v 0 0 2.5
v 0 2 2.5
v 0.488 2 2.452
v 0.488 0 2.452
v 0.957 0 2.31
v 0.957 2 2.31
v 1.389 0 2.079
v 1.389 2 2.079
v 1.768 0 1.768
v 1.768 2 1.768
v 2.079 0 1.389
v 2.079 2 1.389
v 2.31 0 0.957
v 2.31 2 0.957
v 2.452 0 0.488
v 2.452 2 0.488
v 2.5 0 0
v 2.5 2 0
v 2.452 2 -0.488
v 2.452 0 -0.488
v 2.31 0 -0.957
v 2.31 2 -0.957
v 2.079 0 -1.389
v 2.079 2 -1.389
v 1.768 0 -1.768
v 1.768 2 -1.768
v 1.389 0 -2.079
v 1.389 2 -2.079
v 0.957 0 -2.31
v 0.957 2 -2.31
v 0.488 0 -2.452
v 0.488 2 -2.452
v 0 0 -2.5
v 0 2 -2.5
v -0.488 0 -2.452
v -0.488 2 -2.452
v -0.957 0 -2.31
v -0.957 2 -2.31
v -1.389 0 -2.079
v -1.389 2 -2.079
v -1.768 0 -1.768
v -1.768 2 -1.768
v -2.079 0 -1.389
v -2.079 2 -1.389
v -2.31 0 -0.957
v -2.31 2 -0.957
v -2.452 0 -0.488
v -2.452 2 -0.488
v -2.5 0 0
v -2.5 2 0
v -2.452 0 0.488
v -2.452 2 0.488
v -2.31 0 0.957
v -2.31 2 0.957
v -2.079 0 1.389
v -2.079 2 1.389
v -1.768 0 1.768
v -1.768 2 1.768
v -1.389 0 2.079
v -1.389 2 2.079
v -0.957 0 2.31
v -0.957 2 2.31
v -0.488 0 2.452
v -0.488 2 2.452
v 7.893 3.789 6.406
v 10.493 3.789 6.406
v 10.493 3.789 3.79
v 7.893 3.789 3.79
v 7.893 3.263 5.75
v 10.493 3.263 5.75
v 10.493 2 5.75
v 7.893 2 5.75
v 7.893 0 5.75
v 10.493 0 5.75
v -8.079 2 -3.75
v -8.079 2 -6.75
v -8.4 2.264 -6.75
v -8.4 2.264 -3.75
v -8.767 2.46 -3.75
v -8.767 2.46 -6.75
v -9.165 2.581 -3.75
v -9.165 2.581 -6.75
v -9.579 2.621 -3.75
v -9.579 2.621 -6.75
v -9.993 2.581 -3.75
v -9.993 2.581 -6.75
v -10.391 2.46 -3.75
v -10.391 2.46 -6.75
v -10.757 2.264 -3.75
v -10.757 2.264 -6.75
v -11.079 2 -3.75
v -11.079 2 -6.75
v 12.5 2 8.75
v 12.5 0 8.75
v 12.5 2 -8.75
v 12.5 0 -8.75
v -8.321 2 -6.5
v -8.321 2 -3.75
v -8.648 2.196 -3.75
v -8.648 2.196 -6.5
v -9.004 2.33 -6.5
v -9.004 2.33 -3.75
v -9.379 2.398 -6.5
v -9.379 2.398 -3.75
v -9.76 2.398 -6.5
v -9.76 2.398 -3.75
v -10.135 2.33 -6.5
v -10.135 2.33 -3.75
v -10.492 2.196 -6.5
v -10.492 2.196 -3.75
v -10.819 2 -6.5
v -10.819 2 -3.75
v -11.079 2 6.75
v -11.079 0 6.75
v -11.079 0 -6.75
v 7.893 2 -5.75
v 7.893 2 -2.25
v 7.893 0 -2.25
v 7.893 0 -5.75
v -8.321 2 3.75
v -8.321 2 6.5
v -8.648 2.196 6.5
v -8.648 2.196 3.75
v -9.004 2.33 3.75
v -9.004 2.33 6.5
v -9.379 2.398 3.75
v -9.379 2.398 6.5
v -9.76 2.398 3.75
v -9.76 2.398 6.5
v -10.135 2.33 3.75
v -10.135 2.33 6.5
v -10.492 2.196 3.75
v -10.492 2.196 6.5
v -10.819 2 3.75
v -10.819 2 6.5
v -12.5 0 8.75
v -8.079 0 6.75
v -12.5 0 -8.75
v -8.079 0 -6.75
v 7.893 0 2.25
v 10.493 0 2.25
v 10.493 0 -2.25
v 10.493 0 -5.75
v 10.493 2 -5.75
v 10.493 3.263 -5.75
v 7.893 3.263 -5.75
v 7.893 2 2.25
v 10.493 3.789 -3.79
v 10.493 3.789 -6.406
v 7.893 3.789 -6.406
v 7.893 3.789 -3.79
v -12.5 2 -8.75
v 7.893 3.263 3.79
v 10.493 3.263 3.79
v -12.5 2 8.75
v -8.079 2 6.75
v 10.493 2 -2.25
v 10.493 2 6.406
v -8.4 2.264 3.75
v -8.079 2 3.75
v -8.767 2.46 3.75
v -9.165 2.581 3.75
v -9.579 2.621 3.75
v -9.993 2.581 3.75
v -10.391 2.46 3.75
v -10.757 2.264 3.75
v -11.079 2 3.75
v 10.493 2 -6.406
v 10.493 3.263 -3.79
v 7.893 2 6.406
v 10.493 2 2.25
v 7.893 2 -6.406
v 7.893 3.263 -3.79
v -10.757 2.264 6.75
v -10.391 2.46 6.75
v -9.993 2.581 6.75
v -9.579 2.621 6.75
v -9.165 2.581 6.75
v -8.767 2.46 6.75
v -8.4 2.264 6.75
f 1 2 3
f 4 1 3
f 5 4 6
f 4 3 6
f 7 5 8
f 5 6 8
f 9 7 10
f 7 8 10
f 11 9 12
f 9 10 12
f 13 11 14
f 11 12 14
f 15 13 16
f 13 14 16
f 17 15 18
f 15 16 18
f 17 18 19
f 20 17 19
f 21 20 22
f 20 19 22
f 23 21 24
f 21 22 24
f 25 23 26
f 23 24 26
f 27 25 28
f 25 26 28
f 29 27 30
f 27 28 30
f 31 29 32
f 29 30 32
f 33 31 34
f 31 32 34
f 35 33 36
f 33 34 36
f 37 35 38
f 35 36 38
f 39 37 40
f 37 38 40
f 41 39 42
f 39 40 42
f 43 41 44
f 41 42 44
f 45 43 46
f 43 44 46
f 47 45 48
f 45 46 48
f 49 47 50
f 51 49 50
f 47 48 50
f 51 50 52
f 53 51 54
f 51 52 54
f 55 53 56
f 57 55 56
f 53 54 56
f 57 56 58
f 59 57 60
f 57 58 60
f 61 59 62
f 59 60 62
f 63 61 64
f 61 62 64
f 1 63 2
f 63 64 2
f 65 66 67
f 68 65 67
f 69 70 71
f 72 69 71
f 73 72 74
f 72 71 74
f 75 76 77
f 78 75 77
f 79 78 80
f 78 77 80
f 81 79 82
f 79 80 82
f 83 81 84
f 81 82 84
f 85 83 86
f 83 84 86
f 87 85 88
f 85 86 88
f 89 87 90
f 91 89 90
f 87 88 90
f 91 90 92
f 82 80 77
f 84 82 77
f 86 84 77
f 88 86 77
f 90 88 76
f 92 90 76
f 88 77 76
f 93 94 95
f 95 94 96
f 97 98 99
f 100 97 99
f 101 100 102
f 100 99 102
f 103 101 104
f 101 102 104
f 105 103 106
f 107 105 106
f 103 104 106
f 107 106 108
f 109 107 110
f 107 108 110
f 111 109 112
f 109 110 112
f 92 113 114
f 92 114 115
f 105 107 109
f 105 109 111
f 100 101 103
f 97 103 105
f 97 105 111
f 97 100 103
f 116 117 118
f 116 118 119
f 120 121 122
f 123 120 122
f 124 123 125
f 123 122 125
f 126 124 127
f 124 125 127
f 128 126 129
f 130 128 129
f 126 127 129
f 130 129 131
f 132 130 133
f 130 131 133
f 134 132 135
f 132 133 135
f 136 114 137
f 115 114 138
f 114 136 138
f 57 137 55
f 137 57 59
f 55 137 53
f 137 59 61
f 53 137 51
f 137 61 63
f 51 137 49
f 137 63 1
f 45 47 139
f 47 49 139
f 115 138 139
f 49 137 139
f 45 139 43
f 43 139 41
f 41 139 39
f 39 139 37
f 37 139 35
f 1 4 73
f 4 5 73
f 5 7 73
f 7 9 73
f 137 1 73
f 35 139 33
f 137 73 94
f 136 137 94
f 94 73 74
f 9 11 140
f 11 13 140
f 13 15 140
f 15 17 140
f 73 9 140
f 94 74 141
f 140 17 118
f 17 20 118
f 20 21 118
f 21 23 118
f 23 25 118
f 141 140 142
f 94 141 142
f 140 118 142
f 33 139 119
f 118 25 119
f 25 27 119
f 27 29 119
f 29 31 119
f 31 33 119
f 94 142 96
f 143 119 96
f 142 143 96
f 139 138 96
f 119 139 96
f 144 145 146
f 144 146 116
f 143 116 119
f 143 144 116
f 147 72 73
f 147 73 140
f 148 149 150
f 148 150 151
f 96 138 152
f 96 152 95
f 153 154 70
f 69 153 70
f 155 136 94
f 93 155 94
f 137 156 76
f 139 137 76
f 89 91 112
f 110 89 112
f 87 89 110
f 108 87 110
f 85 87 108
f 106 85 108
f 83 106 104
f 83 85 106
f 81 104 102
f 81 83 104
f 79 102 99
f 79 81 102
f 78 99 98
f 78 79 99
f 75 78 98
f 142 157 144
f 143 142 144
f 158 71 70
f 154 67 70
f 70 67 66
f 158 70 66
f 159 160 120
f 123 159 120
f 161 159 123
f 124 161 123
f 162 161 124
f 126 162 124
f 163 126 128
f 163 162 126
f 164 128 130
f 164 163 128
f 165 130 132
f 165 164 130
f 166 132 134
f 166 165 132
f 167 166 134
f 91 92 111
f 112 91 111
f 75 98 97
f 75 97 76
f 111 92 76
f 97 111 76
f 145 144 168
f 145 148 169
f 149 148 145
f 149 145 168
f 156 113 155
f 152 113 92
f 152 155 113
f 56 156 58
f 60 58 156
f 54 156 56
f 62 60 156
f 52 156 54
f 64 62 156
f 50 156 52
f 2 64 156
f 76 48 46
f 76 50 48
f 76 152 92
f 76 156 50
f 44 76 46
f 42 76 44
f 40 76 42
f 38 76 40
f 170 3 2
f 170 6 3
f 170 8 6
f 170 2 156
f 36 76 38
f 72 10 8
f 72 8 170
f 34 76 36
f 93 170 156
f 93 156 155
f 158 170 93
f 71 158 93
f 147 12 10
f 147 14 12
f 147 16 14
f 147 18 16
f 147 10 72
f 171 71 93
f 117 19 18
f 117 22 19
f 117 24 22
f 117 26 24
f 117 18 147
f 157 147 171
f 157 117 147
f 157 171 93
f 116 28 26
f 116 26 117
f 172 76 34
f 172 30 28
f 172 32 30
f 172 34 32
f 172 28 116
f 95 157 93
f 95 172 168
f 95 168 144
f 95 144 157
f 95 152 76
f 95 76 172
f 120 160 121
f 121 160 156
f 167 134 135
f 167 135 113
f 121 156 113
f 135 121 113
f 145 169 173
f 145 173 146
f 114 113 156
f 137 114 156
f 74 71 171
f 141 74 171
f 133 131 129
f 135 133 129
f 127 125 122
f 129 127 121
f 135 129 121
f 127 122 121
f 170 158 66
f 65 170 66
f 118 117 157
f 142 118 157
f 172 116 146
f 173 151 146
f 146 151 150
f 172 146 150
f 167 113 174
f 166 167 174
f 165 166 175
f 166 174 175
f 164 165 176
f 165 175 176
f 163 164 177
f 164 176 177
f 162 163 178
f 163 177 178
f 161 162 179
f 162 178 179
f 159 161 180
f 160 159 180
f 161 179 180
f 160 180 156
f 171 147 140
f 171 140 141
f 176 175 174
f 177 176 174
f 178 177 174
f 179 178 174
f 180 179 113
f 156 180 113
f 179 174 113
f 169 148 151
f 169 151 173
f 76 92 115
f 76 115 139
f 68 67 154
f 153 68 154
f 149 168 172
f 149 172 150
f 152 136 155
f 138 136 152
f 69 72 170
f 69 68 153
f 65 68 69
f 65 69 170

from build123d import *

# Parameters (mm, degrees)
SKETCH_1_W          = 25
SKETCH_1_H          = 17.5
EXTRUDE_1_DEPTH     = 2
SKETCH_2_R          = 2.5
CUT_EXTRUDE_1_DEPTH = 2
SKETCH_3_W          = 2.6
SKETCH_3_H          = 3.5
CUT_EXTRUDE_2_DEPTH = 2
SKETCH_4_W          = 3
SKETCH_4_H          = 13.5
CUT_EXTRUDE_3_DEPTH = 2
EXTRUDE_2_DEPTH     = 2.6
EXTRUDE_3_DEPTH     = 3
EXTRUDE_4_DEPTH     = 3
CUT_EXTRUDE_5_DEPTH = 6.5


with BuildPart() as part:
    # 草图1 → 凸台-拉伸1 (new body)
    with BuildSketch(Plane(origin=(0, 0, 0), x_dir=(1, 0, 0), z_dir=(0, 1, 0))):
        Rectangle(SKETCH_1_W, SKETCH_1_H)
    extrude(amount=EXTRUDE_1_DEPTH)

    # 草图2 → 切除-拉伸1 (cut)
    with BuildSketch(Plane(origin=(0, 2, 0), x_dir=(1, 0, 0), z_dir=(0, 1, 0))):
        with Locations(Location((0, 0, 0), (0, 0, 270))):
            Circle(SKETCH_2_R)
    extrude(amount=-CUT_EXTRUDE_1_DEPTH, mode=Mode.SUBTRACT)

    # 草图3 → 切除-拉伸2 (cut)
    with BuildSketch(Plane(origin=(0, 2, 0), x_dir=(1, 0, 0), z_dir=(0, 1, 0))):
        with Locations((9.193470991, 4)):
            Rectangle(SKETCH_3_W, SKETCH_3_H)
        with Locations((9.193470991, -4)):
            Rectangle(SKETCH_3_W, SKETCH_3_H)
    extrude(amount=-CUT_EXTRUDE_2_DEPTH, mode=Mode.SUBTRACT)

    # 草图4 → 切除-拉伸3 (cut)
    with BuildSketch(Plane(origin=(0, 2, 0), x_dir=(1, 0, 0), z_dir=(0, 1, 0))):
        with Locations((-9.578819664, 0)):
            Rectangle(SKETCH_4_W, SKETCH_4_H)
    extrude(amount=-CUT_EXTRUDE_3_DEPTH, mode=Mode.SUBTRACT)

    # 草图5 → 凸台-拉伸2 (add)
    with BuildSketch(Plane.ZY.offset(-10.493470991)):
        Polygon((-5.75, 2), (-6.406421234, 2), (-6.406421234, 3.789179116), (-3.789523296, 3.789179116), (-3.789523296, 3.263071554), (-5.75, 3.263071554), align=None)
    extrude_2 = extrude(amount=EXTRUDE_2_DEPTH)

    # 镜向1: 凸台-拉伸2 across plane
    add(extrude_2.mirror(Plane.XY))


with BuildPart() as body_2:
    # 草图6 → 凸台-拉伸3 (new body)
    with BuildSketch(Plane.XY.offset(-6.75)):
        with BuildLine():
            Line((-11.078819664, 2), (-8.078819664, 2))
            ThreePointArc((-8.078819664, 2), (-9.578819664, 2.621320344), (-11.078819664, 2))
        make_face()
    extrude(amount=EXTRUDE_3_DEPTH)


with BuildPart() as body_3:
    # 草图7 → 凸台-拉伸4 (new body)
    with BuildSketch(Plane(origin=(0, 0, 6.75), x_dir=(-1, 0, 0), z_dir=(0, 0, -1))):
        with BuildLine():
            Line((8.078819664, 2), (11.078819664, 2))
            ThreePointArc((11.078819664, 2), (9.578819664, 2.621320344), (8.078819664, 2))
        make_face()
    extrude(amount=EXTRUDE_4_DEPTH)


with BuildPart() as cut_extrude_5_tool:
    # 草图8 → 切除-拉伸5 (new, symmetric)
    with BuildSketch(Plane.XY):
        with BuildLine():
            ThreePointArc((-8.320812894, 2), (-9.569707039, 2.406914067), (-10.818601184, 2))
            Line((-10.818601184, 2), (-8.320812894, 2))
        make_face()
        with BuildLine():
            Line((-8.320812894, 2), (-10.818601184, 2))
            ThreePointArc((-10.818601184, 2), (-10.53062962, -1.60280226), (-7.449707039, 0.286914067))
            ThreePointArc((-7.449707039, 0.286914067), (-7.679990713, 1.247836648), (-8.320812894, 2))
        make_face()
    extrude(amount=CUT_EXTRUDE_5_DEPTH, both=True)


with BuildPart() as body_2_1:
    add(body_2.part)

    # 切除-拉伸5: cut by cut_extrude_5_tool
    add(cut_extrude_5_tool.part, mode=Mode.SUBTRACT)


with BuildPart() as body_3_1:
    add(body_3.part)

    # 切除-拉伸5: cut by cut_extrude_5_tool
    add(cut_extrude_5_tool.part, mode=Mode.SUBTRACT)


solid = Compound([part.part, body_2_1.part, body_3_1.part])
